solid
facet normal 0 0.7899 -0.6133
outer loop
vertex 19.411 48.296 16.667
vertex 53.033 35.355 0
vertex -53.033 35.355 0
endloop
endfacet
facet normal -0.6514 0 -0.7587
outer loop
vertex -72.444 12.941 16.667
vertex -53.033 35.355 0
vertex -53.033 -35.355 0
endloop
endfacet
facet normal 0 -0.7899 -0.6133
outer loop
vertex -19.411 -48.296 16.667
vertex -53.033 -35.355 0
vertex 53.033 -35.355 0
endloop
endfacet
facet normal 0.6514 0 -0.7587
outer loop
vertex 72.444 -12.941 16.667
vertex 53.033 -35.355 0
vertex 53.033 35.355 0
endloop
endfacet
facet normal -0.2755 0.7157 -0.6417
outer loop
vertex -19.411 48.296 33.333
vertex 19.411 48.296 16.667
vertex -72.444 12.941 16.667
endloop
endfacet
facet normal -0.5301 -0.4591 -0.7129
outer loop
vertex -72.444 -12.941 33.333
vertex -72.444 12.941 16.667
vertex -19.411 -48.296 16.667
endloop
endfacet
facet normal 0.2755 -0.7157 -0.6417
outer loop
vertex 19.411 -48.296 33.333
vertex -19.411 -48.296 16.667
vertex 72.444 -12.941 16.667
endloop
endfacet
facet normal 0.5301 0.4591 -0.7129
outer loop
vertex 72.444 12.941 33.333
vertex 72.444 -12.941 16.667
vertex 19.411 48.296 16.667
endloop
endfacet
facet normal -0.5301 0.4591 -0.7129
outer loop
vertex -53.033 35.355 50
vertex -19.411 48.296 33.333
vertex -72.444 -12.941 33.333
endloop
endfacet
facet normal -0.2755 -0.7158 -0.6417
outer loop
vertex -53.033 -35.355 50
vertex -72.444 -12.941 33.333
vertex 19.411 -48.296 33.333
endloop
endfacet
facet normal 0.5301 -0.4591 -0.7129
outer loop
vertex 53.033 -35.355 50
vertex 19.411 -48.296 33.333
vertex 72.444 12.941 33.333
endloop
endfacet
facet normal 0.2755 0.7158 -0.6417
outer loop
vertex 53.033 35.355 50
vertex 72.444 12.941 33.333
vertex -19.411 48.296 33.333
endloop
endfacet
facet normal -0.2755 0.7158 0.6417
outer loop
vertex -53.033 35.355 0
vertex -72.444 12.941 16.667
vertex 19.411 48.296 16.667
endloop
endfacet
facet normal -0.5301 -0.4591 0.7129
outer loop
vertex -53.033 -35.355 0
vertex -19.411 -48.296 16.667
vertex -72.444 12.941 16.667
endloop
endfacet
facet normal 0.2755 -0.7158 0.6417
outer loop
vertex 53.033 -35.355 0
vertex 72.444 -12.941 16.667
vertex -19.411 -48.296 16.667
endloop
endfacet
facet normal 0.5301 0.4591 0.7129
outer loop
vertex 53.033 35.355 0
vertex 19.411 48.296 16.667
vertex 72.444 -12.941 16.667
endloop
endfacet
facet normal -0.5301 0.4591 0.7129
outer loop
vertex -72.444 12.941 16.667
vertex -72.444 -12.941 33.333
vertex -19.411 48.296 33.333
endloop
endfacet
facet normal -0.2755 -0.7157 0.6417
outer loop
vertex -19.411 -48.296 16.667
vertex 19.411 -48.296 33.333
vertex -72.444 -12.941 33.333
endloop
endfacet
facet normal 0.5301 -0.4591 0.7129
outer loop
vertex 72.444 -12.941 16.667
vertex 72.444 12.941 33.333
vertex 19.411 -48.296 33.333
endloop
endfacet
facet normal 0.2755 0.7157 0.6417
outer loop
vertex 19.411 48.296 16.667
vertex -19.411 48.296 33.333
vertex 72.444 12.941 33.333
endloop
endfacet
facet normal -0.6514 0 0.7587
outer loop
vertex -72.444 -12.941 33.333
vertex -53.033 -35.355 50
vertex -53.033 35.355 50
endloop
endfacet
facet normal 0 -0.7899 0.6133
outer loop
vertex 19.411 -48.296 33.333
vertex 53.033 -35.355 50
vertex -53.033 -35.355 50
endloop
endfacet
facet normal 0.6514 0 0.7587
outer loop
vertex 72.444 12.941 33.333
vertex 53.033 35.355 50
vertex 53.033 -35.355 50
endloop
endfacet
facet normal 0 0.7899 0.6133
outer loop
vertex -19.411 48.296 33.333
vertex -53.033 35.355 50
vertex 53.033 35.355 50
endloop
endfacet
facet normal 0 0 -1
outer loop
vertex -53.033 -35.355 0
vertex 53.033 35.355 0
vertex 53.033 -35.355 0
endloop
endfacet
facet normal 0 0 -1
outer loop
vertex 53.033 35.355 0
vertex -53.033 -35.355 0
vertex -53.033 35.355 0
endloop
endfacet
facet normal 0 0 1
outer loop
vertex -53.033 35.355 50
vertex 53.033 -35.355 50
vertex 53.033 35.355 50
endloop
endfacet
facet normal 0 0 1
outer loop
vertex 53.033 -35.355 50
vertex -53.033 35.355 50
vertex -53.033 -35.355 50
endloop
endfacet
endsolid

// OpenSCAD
fraction = (sqrt(5) - 1) / 2;
//fraction = sqrt(2) - 1;
//fraction = 2 - sqrt(5);
fraction = 1/3;

radius = 10;
levels = 3;
height = 50;
points = 4;

plane_angle = 360 / points;
level_angle = plane_angle * fraction;

vertexes = [
    for (i = [0: levels])
        for (j = [0: points - 1])
            [ radius * cos(i * level_angle + j * plane_angle),
              radius * sin(i * level_angle + j * plane_angle),
              height * i / levels ]
    ];

triangles = [
    for (i = [1 : levels])
        for (j = [1 : points])
            [ (i - 1) * points + (j % points),
              (i - 1) * points + j - 1,
              i * points + j - 1 ],
    for (i = [1 : levels])
        for (j = [1 : points])
            [ i * points + j - 1,
              i * points + (j % points),
              (i - 1) * points + (j % points) ],
    [ for (i = [0 : points - 1]) i ],
    [ for (i = [1 : points]) levels * points + points - i ],

    ];

scale([15/2,10/2]) rotate(45) polyhedron(points = vertexes, faces = triangles, convexity = 2);
